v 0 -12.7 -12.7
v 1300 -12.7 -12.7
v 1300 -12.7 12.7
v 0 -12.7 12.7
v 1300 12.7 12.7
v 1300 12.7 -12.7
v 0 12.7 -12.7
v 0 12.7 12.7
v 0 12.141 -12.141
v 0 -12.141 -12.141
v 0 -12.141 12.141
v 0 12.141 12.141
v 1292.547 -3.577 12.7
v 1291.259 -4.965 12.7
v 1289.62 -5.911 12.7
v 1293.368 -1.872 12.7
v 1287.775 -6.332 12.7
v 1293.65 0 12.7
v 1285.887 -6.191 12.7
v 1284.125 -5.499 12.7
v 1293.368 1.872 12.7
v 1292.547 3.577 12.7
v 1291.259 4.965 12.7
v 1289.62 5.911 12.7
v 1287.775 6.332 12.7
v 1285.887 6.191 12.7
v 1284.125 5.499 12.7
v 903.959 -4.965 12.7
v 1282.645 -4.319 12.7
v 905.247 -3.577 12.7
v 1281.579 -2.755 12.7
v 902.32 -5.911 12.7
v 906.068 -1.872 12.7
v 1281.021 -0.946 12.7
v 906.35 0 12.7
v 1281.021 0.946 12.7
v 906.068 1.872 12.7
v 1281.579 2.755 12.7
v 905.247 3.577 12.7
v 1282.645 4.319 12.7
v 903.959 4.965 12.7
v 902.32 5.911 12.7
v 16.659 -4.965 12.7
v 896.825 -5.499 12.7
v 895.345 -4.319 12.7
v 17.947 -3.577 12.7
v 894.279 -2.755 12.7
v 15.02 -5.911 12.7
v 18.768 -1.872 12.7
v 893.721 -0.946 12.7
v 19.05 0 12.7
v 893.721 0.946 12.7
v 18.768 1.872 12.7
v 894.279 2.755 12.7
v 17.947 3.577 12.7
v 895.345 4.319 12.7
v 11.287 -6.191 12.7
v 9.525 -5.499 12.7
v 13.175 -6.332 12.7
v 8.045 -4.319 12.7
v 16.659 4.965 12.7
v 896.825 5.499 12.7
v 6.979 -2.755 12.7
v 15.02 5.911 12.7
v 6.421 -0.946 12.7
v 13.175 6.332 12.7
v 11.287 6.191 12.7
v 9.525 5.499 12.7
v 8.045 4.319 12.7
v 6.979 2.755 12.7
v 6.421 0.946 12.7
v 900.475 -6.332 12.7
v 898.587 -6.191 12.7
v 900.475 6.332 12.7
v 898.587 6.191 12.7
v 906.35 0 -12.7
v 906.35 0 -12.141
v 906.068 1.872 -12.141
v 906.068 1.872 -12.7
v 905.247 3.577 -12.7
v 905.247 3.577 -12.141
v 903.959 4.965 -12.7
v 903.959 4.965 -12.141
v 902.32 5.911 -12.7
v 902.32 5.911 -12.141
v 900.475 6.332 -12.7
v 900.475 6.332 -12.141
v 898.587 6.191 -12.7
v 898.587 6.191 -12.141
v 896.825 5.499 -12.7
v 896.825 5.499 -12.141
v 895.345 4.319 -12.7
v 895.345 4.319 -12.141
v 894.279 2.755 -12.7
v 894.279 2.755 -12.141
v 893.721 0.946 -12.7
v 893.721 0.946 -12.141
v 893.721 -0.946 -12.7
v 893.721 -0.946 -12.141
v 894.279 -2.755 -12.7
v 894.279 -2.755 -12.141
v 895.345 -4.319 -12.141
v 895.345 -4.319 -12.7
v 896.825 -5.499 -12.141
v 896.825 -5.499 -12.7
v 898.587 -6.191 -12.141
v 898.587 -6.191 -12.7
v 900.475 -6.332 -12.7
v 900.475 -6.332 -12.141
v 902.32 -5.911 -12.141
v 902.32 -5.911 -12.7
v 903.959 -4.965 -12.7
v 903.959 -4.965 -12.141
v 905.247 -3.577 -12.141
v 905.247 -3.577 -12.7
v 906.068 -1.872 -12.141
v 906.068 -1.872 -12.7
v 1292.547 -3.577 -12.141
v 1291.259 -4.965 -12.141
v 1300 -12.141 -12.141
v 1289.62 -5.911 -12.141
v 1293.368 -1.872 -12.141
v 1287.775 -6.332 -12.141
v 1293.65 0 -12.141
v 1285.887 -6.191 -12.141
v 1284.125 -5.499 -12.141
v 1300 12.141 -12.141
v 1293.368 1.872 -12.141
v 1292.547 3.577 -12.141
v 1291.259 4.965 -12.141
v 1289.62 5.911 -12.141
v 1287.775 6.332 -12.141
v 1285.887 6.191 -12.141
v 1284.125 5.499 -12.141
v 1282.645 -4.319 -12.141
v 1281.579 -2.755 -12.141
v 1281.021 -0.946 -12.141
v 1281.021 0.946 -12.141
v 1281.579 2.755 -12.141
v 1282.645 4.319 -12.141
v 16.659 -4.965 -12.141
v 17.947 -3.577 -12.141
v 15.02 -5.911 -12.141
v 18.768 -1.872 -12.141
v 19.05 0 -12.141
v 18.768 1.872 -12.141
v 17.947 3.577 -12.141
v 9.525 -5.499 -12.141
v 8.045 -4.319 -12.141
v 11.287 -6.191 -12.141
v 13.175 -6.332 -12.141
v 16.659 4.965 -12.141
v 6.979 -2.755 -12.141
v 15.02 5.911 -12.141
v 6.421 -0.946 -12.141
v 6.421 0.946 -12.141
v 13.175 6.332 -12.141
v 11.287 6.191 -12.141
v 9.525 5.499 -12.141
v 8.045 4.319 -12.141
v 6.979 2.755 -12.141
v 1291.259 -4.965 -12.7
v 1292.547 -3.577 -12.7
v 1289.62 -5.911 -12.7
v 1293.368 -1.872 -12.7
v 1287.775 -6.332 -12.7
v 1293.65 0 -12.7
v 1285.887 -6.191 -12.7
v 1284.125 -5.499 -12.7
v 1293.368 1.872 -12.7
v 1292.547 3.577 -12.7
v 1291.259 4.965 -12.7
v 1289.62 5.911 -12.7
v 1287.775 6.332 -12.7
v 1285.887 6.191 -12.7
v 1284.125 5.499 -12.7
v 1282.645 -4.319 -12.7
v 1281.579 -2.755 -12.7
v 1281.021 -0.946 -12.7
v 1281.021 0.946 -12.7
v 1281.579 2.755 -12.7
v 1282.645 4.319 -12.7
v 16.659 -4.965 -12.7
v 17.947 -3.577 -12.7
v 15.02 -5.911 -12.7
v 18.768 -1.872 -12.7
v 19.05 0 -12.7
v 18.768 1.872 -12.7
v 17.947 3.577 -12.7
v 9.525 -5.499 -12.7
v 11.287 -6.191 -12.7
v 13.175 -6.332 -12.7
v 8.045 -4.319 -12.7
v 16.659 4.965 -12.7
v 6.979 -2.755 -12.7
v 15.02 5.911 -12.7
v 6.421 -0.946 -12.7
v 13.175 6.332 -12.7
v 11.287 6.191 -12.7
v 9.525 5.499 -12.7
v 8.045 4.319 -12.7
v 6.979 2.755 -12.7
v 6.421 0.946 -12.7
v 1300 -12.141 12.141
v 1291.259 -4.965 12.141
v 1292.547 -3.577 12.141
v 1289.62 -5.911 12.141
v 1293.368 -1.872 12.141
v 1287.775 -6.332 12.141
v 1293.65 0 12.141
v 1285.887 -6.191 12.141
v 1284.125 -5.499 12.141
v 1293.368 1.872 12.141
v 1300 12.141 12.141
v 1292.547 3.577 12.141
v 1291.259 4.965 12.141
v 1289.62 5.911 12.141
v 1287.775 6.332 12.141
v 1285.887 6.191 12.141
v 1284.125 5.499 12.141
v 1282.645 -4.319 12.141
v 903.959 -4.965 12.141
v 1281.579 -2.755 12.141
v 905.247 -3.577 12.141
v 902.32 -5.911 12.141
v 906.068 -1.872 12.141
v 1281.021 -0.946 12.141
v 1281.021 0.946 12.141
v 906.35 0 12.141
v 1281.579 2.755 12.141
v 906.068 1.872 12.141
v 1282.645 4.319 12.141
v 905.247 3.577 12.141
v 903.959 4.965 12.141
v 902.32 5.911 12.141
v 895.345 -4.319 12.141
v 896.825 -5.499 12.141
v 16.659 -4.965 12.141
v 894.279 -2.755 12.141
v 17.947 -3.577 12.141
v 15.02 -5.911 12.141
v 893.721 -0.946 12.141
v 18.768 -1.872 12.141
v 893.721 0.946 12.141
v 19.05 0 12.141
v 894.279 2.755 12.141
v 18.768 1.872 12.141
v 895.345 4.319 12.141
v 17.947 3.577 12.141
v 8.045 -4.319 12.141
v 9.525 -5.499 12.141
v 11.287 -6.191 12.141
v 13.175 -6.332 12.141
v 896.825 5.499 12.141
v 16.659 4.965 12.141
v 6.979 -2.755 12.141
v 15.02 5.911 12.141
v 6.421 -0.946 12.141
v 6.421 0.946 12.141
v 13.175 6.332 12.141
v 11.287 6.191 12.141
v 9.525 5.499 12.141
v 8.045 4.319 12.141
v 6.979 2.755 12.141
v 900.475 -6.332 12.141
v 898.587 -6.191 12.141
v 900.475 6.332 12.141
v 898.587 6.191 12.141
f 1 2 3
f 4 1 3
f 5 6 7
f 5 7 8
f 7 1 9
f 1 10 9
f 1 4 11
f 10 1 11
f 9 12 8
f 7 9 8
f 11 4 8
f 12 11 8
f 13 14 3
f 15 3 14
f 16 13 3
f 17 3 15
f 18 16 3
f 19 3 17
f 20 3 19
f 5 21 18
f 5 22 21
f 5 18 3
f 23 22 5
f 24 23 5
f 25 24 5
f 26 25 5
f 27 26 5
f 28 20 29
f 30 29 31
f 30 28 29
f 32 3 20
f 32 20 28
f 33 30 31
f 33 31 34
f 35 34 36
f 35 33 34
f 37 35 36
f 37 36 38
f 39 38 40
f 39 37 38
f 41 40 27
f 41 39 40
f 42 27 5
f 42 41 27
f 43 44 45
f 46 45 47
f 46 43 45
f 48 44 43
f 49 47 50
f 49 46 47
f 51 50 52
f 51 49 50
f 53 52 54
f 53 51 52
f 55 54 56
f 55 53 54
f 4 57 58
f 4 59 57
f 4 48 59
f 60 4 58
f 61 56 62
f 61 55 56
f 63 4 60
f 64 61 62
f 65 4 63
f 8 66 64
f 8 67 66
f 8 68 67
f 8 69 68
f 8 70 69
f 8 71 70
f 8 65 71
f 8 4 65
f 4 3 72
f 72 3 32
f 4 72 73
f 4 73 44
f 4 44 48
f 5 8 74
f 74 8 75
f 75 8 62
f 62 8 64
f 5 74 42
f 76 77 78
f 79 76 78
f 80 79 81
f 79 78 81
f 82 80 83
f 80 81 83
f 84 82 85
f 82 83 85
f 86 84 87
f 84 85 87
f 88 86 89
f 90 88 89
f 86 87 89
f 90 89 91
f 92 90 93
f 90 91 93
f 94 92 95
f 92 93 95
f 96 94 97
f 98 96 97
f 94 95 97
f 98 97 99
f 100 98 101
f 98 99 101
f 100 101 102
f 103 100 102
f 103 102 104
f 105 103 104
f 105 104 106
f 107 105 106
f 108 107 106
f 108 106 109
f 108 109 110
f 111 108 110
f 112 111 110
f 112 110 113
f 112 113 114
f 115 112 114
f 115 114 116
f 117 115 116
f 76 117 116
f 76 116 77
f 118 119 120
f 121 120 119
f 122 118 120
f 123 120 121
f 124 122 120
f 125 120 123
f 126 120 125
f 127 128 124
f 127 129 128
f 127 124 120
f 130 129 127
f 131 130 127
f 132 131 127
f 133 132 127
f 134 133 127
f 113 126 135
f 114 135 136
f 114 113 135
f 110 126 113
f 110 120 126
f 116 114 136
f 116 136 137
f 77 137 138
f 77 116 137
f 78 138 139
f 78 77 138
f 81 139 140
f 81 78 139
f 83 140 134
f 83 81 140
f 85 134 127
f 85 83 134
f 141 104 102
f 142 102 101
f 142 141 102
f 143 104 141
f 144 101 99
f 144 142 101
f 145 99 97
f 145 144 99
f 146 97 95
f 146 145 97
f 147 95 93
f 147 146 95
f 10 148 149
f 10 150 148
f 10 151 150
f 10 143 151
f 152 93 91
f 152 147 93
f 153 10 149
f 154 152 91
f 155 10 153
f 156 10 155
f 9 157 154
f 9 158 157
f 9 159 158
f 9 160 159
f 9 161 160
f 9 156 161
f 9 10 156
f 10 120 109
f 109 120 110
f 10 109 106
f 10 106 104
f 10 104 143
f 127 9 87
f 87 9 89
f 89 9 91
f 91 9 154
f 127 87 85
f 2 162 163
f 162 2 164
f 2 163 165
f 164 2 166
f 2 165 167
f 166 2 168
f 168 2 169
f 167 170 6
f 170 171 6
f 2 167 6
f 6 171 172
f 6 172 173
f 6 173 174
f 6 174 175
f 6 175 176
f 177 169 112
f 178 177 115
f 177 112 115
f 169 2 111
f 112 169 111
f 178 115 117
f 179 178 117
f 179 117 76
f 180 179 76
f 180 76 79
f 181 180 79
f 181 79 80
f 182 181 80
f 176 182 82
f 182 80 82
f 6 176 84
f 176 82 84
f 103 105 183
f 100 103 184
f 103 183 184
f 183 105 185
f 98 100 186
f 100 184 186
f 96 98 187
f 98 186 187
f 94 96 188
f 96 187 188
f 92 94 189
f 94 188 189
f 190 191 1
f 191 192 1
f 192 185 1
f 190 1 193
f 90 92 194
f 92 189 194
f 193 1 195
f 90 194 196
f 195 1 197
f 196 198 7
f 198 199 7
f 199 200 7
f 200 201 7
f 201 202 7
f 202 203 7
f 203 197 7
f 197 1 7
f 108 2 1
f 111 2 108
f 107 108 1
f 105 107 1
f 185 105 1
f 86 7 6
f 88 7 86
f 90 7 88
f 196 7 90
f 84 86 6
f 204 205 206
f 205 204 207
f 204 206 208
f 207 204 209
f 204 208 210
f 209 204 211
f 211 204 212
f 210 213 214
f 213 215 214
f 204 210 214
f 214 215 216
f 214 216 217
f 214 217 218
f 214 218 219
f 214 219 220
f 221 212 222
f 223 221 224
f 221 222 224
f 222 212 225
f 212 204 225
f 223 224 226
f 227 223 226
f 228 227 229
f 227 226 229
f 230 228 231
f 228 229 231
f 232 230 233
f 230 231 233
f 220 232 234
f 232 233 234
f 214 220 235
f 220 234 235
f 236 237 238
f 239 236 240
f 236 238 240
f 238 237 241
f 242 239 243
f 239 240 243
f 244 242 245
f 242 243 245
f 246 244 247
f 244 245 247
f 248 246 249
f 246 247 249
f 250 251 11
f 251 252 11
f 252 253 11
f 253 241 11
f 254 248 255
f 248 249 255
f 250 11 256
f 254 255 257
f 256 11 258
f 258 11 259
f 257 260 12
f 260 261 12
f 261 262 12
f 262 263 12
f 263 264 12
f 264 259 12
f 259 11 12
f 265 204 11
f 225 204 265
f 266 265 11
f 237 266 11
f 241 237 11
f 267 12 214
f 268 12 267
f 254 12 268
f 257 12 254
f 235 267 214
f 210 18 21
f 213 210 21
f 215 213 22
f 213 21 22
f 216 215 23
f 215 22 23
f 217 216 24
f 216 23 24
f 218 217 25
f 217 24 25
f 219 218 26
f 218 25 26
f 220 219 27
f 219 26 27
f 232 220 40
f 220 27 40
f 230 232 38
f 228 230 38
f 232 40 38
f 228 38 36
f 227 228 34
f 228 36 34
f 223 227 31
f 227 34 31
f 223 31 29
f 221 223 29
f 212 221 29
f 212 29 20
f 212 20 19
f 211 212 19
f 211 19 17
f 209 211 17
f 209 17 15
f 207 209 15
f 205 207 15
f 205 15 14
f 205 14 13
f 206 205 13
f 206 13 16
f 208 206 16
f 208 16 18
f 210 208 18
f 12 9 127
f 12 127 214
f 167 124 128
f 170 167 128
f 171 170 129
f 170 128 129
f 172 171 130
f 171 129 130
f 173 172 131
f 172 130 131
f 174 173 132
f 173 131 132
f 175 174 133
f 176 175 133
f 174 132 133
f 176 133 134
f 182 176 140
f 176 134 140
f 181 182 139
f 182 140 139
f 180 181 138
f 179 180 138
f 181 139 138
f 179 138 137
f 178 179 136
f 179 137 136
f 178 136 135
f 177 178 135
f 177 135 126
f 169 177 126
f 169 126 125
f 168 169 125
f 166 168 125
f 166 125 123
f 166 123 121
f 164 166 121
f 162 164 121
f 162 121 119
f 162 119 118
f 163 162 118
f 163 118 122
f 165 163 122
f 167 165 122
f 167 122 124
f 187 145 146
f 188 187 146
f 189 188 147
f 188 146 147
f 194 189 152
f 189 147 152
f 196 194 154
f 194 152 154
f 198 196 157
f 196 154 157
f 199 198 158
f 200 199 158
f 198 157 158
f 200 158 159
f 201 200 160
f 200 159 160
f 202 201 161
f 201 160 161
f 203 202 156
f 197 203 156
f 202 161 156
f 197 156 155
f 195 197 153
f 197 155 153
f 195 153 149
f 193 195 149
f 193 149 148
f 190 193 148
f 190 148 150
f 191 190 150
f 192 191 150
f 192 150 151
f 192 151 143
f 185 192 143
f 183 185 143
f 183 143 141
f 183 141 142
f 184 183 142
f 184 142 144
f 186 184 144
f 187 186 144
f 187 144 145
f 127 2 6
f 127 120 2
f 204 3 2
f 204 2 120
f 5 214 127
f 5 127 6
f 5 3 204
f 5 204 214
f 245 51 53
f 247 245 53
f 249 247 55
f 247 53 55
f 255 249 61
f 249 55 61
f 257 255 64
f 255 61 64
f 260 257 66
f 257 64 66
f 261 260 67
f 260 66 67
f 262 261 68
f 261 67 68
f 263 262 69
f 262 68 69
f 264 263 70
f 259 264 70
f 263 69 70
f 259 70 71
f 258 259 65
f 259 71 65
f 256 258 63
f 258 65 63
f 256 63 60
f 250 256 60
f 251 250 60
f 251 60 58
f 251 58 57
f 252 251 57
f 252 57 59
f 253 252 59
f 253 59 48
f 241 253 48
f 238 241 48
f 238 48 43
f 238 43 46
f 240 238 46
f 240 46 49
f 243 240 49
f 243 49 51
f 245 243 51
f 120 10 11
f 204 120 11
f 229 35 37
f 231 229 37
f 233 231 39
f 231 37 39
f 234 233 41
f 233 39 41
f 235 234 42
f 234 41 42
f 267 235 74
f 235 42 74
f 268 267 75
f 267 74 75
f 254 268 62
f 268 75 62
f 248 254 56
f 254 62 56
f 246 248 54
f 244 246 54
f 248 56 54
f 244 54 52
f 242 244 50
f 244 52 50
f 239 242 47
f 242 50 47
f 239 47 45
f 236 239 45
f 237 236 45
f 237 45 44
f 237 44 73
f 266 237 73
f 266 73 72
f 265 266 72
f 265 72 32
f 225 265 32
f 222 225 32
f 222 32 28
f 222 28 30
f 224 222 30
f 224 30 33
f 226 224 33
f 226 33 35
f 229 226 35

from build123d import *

# Parameters (mm, degrees)
SKETCH1_W                              = 25.4
SKETCH1_H                              = 25.4
SKETCH1_W_2                            = 24.2824
SKETCH1_H_2                            = 24.2824
AL_TUBE_SQUARE_1_SQ_X_022_WALL_3_DEPTH = 1300
CROQUIS3_R                             = 6.35
CORTAR_EXTRUIR1_DEPTH                  = 1301.310136083


with BuildPart() as part:
    # Sketch1 → Al tube (square) 1 SQ X .022 WALL(3) (new body)
    with BuildSketch(Plane.YZ):
        Rectangle(SKETCH1_W, SKETCH1_H)
        Rectangle(SKETCH1_W_2, SKETCH1_H_2, mode=Mode.SUBTRACT)
    extrude(amount=AL_TUBE_SQUARE_1_SQ_X_022_WALL_3_DEPTH)

    # Croquis3 → Cortar-Extruir1 (cut, through all)
    with BuildSketch(Plane.XY.offset(12.7)):
        with Locations((1287.3, 0)):
            Circle(CROQUIS3_R)
        with Locations((900, 0)):
            Circle(CROQUIS3_R)
        with Locations((12.7, 0)):
            Circle(CROQUIS3_R)
    extrude(amount=-CORTAR_EXTRUIR1_DEPTH, mode=Mode.SUBTRACT)


solid = part.part
